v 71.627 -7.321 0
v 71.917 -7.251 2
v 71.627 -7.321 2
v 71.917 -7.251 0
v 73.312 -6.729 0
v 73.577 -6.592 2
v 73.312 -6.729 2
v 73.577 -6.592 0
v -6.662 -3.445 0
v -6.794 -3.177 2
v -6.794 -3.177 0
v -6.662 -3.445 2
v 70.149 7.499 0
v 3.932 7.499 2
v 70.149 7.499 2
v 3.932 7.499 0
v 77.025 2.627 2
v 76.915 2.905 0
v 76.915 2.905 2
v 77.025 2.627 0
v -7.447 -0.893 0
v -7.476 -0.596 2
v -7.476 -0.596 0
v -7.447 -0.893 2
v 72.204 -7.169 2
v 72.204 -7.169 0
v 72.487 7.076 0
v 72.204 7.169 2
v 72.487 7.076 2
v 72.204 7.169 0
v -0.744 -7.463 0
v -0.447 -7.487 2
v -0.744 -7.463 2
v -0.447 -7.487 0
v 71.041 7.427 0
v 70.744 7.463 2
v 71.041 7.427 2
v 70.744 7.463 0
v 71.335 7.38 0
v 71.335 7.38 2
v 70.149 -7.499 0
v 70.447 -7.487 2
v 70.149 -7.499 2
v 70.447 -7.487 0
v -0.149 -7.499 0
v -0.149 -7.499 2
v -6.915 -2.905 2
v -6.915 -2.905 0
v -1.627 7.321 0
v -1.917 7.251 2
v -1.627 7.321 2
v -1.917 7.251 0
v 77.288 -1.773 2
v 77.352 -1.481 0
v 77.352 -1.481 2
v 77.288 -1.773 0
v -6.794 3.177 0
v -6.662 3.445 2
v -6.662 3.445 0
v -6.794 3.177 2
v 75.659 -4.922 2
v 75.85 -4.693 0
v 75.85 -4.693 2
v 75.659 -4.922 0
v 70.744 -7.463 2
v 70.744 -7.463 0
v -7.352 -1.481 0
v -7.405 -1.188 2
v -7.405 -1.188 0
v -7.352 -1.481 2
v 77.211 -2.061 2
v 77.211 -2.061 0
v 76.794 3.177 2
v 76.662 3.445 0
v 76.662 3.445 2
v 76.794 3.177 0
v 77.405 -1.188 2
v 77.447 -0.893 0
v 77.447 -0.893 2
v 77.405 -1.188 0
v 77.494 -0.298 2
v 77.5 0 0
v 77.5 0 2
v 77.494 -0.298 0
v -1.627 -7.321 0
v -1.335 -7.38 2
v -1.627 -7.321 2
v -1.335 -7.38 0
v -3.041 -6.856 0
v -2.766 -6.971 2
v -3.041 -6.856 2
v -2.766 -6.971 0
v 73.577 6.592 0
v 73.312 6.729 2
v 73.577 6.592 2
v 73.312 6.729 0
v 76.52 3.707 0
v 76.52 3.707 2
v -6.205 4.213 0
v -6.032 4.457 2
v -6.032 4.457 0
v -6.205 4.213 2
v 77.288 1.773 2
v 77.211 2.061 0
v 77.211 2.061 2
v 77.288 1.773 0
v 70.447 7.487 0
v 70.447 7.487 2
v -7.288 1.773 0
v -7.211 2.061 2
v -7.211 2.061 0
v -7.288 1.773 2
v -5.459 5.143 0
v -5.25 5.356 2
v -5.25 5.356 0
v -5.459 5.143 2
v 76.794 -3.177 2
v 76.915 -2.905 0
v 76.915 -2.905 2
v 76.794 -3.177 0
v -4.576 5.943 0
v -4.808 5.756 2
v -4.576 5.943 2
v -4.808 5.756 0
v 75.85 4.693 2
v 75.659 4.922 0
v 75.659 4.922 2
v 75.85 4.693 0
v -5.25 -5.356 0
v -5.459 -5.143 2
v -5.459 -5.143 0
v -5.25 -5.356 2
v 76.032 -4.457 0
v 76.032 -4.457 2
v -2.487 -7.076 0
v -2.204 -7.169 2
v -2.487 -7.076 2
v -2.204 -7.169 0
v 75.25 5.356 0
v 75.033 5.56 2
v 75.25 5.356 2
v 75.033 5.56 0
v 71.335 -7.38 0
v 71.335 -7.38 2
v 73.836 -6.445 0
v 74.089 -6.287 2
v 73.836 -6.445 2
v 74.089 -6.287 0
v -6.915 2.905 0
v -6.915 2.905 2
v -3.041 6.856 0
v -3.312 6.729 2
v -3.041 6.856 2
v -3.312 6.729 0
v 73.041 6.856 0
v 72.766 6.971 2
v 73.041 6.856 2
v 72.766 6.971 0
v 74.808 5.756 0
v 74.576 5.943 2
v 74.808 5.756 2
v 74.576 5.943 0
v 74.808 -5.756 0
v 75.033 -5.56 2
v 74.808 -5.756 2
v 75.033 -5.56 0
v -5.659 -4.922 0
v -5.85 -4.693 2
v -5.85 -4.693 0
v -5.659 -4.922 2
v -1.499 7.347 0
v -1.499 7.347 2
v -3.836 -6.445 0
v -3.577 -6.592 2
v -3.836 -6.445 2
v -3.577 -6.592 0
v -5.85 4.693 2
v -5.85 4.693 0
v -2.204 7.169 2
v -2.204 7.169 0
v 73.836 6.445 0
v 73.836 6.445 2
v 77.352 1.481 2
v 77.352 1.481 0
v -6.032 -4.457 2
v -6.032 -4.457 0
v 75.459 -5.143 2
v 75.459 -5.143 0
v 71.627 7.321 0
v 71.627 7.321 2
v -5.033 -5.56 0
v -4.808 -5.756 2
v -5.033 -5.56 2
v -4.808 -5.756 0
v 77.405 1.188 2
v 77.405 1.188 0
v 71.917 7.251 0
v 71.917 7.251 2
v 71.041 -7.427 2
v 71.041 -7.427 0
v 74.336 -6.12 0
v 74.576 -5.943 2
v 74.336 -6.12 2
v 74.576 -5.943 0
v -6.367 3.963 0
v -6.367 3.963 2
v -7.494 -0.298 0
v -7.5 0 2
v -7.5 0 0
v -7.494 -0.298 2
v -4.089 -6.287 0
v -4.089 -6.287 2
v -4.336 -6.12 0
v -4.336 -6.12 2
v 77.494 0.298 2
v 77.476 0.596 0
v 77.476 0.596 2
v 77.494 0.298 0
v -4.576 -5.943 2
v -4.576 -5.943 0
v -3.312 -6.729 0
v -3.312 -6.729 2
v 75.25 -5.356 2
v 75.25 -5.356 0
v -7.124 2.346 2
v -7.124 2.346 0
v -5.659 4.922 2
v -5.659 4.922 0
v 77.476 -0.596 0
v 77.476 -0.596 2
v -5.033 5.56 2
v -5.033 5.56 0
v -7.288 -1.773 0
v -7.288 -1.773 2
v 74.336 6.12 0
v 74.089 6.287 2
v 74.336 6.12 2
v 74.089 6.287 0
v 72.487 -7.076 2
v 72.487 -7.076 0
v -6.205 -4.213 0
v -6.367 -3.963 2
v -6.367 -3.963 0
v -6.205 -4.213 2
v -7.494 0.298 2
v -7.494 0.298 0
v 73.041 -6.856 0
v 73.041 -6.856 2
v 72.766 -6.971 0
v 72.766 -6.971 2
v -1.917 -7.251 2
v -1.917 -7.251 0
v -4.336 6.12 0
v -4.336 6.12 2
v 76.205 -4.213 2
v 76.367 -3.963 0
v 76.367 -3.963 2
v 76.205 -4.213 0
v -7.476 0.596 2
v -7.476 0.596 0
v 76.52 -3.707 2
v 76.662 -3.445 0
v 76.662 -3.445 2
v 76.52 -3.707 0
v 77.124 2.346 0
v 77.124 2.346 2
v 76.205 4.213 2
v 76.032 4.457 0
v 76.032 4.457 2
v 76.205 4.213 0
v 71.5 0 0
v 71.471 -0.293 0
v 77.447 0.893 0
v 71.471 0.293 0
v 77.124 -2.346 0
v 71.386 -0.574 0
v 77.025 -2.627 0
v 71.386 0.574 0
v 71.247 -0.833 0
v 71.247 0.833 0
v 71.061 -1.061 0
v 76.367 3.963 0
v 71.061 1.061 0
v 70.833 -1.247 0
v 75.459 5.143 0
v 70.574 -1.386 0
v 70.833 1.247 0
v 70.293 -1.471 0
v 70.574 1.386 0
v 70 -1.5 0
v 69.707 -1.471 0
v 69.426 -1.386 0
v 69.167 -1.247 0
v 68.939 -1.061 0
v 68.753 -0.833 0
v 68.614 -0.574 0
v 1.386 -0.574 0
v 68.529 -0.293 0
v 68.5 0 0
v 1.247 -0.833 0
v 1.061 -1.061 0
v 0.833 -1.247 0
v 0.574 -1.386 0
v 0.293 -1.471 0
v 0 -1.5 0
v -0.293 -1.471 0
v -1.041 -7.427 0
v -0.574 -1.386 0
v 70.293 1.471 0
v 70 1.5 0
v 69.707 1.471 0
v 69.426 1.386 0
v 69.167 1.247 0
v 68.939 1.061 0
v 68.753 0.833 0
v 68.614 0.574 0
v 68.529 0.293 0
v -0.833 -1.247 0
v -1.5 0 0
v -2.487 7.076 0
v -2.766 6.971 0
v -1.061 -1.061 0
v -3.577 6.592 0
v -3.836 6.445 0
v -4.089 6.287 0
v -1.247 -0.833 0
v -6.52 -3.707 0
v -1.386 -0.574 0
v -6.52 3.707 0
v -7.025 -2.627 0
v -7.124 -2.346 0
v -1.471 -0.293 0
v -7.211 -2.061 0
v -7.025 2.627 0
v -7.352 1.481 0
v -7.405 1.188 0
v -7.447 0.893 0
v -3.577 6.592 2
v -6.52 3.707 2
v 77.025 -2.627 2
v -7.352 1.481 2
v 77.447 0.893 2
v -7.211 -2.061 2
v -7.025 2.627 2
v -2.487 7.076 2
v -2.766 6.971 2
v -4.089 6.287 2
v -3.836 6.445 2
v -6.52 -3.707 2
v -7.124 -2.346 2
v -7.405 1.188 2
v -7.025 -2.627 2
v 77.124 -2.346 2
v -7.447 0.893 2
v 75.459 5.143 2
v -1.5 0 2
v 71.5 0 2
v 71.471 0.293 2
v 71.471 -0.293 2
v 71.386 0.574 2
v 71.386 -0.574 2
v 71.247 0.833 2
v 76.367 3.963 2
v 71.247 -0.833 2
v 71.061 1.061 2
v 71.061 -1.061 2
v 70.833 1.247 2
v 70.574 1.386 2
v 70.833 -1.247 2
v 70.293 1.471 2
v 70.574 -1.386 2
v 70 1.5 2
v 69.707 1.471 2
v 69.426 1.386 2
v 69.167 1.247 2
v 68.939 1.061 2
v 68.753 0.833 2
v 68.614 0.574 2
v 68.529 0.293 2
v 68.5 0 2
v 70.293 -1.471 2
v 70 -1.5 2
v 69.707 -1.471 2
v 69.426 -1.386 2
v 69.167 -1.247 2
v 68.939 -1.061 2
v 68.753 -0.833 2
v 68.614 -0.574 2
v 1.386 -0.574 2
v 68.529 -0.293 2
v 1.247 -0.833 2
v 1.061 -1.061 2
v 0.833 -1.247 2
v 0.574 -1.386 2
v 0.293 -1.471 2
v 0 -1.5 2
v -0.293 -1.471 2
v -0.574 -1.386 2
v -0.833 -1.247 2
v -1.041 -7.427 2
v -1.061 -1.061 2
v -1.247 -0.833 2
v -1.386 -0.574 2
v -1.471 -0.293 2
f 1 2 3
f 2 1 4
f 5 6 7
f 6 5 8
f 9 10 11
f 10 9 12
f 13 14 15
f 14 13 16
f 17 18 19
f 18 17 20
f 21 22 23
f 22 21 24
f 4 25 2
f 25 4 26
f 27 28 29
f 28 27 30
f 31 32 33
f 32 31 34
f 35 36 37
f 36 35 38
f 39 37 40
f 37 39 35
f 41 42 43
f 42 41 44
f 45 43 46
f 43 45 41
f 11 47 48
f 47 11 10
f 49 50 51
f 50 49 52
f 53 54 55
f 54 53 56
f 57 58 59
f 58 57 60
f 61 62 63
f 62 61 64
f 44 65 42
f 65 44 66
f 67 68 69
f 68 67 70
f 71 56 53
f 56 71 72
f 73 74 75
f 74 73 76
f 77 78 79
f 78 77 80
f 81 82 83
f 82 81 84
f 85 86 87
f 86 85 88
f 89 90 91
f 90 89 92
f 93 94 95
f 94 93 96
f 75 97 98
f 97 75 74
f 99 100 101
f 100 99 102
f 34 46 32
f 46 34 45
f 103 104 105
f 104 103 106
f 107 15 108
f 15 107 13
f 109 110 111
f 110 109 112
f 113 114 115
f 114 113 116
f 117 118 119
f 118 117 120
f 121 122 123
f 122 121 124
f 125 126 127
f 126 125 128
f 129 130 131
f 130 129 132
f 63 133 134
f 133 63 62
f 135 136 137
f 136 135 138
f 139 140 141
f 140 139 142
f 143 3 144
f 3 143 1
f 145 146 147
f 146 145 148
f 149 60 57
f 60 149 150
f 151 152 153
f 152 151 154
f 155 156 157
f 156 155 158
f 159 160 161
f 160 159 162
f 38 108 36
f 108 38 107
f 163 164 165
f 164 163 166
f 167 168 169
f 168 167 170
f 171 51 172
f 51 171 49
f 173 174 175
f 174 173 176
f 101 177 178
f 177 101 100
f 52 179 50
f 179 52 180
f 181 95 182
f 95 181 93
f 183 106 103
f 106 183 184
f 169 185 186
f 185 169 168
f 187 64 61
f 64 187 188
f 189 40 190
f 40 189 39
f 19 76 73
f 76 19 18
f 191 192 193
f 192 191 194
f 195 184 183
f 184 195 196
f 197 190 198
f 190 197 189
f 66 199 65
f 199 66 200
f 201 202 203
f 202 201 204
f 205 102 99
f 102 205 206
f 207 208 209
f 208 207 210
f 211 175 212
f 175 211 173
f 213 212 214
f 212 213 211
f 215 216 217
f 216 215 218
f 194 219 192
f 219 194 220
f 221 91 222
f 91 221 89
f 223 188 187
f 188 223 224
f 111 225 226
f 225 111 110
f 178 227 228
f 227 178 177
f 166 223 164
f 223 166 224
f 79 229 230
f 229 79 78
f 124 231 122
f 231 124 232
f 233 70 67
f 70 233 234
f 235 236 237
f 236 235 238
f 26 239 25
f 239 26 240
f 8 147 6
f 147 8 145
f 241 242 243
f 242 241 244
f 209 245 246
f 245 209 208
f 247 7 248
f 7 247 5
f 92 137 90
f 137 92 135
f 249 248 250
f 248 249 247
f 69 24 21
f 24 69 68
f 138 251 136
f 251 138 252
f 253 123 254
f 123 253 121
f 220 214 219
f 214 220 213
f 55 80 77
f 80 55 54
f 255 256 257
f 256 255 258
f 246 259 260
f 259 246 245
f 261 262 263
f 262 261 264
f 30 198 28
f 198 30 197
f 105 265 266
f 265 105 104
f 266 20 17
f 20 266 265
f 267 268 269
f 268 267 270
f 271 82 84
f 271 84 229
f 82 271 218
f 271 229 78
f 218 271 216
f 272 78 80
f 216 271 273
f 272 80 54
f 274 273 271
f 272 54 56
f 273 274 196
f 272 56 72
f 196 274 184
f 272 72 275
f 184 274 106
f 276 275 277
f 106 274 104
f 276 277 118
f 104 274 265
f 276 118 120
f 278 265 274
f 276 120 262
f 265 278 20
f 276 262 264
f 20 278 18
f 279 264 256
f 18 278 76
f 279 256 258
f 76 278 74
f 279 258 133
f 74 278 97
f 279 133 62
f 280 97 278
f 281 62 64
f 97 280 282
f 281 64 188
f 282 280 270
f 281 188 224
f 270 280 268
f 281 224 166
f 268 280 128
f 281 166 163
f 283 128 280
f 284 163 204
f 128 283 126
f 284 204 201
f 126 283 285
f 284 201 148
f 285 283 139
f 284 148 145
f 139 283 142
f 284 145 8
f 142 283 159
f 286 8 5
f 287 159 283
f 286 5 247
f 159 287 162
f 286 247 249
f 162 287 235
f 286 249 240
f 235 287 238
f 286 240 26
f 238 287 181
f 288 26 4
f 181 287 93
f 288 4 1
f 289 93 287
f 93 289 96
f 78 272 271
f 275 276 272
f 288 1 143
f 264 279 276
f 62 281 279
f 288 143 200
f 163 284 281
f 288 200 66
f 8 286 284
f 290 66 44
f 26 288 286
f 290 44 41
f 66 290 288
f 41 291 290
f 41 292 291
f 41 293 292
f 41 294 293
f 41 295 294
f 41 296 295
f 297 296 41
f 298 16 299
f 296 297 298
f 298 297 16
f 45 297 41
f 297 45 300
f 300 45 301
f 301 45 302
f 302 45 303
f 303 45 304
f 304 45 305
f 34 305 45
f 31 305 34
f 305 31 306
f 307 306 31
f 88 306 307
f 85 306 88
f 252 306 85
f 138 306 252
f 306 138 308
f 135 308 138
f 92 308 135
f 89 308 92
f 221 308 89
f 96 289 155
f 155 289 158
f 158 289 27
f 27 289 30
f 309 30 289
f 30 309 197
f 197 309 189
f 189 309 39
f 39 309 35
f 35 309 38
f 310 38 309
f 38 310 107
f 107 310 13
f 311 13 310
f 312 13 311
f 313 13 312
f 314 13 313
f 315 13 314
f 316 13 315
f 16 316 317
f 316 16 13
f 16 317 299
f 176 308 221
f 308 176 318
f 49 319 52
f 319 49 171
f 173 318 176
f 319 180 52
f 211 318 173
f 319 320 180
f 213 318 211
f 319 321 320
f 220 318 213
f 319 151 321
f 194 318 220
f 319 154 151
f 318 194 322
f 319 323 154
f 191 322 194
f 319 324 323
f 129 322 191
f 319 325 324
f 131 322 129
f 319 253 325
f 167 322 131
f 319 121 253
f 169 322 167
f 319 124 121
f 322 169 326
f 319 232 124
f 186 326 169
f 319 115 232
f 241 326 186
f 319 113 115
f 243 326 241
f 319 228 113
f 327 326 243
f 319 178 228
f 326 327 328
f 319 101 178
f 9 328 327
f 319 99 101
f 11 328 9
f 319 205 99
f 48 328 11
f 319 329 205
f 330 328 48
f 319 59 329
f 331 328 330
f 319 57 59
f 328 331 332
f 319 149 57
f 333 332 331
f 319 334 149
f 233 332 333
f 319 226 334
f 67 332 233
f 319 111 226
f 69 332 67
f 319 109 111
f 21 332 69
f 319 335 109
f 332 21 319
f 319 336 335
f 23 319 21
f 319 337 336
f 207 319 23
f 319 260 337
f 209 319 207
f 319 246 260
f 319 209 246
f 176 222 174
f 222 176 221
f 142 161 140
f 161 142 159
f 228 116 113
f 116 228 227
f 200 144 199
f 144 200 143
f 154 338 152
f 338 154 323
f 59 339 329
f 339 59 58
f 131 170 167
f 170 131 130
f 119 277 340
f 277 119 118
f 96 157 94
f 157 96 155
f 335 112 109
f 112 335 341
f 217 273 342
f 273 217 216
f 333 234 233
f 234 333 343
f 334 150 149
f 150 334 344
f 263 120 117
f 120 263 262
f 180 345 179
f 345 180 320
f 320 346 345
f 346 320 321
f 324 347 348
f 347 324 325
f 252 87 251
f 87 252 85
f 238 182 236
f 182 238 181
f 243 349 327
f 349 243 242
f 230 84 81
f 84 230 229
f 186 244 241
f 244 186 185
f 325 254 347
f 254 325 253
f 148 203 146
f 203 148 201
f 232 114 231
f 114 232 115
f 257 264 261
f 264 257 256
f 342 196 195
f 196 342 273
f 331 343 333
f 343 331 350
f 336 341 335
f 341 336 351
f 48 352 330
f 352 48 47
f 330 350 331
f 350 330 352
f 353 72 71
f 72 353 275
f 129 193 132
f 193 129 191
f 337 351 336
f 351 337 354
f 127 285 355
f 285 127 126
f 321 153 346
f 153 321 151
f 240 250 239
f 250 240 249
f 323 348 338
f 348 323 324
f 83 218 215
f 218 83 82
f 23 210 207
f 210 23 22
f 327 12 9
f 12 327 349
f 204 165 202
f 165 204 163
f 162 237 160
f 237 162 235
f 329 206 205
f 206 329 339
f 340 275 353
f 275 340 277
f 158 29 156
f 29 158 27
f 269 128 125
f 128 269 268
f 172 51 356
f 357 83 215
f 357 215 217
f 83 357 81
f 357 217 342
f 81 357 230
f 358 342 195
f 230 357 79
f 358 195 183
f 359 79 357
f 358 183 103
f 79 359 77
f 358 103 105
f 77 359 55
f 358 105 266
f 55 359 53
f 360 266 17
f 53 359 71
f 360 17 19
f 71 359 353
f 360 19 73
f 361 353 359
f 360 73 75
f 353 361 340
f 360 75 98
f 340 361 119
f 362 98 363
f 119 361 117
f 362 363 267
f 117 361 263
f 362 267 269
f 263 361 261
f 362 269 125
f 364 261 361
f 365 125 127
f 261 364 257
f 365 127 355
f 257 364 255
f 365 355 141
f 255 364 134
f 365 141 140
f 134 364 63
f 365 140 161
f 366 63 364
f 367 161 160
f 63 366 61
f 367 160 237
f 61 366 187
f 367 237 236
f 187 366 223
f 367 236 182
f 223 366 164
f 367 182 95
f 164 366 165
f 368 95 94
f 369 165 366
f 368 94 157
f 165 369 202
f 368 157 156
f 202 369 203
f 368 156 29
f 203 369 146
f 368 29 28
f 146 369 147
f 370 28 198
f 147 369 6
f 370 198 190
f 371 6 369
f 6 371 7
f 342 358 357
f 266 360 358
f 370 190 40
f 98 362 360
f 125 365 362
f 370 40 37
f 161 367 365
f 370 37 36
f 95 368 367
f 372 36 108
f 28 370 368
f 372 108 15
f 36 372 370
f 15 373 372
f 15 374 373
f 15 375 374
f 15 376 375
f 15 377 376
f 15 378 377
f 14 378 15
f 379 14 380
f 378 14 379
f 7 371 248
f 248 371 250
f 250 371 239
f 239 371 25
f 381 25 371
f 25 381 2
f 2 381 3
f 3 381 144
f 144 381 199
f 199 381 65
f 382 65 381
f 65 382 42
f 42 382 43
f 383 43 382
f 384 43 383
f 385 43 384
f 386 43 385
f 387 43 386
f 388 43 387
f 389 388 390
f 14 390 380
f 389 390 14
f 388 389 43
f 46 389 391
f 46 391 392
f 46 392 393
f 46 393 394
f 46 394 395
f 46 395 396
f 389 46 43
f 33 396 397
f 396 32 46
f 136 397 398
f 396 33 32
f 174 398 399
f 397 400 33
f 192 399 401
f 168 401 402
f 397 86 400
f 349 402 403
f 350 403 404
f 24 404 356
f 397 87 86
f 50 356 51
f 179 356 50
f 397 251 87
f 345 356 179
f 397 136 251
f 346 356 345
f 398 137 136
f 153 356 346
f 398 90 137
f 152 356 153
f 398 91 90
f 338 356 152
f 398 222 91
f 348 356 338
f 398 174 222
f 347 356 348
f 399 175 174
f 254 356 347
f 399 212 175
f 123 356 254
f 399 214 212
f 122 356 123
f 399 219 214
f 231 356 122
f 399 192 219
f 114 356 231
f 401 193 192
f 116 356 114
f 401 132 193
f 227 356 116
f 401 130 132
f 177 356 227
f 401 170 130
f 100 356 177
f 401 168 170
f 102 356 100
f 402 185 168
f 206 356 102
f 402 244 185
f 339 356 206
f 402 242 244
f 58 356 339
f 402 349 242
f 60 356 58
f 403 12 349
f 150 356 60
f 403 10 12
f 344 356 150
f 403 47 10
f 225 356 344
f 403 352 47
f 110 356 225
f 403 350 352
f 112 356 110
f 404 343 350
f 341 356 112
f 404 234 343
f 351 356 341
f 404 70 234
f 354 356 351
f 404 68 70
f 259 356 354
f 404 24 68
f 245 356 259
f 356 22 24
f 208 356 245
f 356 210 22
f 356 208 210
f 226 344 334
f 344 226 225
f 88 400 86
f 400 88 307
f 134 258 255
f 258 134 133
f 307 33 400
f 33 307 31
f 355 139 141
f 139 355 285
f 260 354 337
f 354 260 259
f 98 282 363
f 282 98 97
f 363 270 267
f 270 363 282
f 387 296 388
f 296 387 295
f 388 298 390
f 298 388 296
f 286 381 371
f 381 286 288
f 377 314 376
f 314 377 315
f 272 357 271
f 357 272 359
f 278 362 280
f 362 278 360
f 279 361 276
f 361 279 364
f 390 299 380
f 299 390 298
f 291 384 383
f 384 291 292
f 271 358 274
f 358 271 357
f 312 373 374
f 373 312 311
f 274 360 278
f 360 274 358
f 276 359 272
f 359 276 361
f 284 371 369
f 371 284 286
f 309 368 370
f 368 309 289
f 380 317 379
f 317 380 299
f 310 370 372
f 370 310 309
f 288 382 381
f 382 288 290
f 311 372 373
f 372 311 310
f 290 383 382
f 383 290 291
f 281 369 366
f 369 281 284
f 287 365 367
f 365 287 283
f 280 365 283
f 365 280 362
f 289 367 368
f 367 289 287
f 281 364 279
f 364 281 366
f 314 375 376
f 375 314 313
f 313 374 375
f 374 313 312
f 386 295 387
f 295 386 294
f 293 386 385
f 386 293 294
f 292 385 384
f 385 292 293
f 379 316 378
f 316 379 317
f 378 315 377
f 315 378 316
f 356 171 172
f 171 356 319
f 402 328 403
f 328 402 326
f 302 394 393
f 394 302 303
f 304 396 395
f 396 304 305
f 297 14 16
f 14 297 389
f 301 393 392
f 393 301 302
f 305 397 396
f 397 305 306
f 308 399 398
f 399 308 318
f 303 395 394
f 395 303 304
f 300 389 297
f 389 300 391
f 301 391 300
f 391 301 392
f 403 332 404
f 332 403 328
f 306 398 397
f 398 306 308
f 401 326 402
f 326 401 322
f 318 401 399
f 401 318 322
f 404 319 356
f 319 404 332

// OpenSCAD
width = 15;
thickness = 2;
length = 70;
screw_radius = 1.5;

$fs = 0.3;
$fa = 1;

difference() {
	hull() {
		cylinder(r=width / 2, h=thickness);
		translate([length, 0, 0]) {
			cylinder(r=width / 2, h=thickness);
		}
	}
	translate([length, 0, -1]) {
		cylinder(r=screw_radius, h=thickness + 2);
	}
	translate([0, 0, -1]) {
		hull() {
			cylinder(r=screw_radius, h=thickness + 2);
			translate([screw_radius * 2, width + screw_radius * 3, 0]) {
				cylinder(r=screw_radius * 3, h=thickness + 2);
			}
		}
	}
}
